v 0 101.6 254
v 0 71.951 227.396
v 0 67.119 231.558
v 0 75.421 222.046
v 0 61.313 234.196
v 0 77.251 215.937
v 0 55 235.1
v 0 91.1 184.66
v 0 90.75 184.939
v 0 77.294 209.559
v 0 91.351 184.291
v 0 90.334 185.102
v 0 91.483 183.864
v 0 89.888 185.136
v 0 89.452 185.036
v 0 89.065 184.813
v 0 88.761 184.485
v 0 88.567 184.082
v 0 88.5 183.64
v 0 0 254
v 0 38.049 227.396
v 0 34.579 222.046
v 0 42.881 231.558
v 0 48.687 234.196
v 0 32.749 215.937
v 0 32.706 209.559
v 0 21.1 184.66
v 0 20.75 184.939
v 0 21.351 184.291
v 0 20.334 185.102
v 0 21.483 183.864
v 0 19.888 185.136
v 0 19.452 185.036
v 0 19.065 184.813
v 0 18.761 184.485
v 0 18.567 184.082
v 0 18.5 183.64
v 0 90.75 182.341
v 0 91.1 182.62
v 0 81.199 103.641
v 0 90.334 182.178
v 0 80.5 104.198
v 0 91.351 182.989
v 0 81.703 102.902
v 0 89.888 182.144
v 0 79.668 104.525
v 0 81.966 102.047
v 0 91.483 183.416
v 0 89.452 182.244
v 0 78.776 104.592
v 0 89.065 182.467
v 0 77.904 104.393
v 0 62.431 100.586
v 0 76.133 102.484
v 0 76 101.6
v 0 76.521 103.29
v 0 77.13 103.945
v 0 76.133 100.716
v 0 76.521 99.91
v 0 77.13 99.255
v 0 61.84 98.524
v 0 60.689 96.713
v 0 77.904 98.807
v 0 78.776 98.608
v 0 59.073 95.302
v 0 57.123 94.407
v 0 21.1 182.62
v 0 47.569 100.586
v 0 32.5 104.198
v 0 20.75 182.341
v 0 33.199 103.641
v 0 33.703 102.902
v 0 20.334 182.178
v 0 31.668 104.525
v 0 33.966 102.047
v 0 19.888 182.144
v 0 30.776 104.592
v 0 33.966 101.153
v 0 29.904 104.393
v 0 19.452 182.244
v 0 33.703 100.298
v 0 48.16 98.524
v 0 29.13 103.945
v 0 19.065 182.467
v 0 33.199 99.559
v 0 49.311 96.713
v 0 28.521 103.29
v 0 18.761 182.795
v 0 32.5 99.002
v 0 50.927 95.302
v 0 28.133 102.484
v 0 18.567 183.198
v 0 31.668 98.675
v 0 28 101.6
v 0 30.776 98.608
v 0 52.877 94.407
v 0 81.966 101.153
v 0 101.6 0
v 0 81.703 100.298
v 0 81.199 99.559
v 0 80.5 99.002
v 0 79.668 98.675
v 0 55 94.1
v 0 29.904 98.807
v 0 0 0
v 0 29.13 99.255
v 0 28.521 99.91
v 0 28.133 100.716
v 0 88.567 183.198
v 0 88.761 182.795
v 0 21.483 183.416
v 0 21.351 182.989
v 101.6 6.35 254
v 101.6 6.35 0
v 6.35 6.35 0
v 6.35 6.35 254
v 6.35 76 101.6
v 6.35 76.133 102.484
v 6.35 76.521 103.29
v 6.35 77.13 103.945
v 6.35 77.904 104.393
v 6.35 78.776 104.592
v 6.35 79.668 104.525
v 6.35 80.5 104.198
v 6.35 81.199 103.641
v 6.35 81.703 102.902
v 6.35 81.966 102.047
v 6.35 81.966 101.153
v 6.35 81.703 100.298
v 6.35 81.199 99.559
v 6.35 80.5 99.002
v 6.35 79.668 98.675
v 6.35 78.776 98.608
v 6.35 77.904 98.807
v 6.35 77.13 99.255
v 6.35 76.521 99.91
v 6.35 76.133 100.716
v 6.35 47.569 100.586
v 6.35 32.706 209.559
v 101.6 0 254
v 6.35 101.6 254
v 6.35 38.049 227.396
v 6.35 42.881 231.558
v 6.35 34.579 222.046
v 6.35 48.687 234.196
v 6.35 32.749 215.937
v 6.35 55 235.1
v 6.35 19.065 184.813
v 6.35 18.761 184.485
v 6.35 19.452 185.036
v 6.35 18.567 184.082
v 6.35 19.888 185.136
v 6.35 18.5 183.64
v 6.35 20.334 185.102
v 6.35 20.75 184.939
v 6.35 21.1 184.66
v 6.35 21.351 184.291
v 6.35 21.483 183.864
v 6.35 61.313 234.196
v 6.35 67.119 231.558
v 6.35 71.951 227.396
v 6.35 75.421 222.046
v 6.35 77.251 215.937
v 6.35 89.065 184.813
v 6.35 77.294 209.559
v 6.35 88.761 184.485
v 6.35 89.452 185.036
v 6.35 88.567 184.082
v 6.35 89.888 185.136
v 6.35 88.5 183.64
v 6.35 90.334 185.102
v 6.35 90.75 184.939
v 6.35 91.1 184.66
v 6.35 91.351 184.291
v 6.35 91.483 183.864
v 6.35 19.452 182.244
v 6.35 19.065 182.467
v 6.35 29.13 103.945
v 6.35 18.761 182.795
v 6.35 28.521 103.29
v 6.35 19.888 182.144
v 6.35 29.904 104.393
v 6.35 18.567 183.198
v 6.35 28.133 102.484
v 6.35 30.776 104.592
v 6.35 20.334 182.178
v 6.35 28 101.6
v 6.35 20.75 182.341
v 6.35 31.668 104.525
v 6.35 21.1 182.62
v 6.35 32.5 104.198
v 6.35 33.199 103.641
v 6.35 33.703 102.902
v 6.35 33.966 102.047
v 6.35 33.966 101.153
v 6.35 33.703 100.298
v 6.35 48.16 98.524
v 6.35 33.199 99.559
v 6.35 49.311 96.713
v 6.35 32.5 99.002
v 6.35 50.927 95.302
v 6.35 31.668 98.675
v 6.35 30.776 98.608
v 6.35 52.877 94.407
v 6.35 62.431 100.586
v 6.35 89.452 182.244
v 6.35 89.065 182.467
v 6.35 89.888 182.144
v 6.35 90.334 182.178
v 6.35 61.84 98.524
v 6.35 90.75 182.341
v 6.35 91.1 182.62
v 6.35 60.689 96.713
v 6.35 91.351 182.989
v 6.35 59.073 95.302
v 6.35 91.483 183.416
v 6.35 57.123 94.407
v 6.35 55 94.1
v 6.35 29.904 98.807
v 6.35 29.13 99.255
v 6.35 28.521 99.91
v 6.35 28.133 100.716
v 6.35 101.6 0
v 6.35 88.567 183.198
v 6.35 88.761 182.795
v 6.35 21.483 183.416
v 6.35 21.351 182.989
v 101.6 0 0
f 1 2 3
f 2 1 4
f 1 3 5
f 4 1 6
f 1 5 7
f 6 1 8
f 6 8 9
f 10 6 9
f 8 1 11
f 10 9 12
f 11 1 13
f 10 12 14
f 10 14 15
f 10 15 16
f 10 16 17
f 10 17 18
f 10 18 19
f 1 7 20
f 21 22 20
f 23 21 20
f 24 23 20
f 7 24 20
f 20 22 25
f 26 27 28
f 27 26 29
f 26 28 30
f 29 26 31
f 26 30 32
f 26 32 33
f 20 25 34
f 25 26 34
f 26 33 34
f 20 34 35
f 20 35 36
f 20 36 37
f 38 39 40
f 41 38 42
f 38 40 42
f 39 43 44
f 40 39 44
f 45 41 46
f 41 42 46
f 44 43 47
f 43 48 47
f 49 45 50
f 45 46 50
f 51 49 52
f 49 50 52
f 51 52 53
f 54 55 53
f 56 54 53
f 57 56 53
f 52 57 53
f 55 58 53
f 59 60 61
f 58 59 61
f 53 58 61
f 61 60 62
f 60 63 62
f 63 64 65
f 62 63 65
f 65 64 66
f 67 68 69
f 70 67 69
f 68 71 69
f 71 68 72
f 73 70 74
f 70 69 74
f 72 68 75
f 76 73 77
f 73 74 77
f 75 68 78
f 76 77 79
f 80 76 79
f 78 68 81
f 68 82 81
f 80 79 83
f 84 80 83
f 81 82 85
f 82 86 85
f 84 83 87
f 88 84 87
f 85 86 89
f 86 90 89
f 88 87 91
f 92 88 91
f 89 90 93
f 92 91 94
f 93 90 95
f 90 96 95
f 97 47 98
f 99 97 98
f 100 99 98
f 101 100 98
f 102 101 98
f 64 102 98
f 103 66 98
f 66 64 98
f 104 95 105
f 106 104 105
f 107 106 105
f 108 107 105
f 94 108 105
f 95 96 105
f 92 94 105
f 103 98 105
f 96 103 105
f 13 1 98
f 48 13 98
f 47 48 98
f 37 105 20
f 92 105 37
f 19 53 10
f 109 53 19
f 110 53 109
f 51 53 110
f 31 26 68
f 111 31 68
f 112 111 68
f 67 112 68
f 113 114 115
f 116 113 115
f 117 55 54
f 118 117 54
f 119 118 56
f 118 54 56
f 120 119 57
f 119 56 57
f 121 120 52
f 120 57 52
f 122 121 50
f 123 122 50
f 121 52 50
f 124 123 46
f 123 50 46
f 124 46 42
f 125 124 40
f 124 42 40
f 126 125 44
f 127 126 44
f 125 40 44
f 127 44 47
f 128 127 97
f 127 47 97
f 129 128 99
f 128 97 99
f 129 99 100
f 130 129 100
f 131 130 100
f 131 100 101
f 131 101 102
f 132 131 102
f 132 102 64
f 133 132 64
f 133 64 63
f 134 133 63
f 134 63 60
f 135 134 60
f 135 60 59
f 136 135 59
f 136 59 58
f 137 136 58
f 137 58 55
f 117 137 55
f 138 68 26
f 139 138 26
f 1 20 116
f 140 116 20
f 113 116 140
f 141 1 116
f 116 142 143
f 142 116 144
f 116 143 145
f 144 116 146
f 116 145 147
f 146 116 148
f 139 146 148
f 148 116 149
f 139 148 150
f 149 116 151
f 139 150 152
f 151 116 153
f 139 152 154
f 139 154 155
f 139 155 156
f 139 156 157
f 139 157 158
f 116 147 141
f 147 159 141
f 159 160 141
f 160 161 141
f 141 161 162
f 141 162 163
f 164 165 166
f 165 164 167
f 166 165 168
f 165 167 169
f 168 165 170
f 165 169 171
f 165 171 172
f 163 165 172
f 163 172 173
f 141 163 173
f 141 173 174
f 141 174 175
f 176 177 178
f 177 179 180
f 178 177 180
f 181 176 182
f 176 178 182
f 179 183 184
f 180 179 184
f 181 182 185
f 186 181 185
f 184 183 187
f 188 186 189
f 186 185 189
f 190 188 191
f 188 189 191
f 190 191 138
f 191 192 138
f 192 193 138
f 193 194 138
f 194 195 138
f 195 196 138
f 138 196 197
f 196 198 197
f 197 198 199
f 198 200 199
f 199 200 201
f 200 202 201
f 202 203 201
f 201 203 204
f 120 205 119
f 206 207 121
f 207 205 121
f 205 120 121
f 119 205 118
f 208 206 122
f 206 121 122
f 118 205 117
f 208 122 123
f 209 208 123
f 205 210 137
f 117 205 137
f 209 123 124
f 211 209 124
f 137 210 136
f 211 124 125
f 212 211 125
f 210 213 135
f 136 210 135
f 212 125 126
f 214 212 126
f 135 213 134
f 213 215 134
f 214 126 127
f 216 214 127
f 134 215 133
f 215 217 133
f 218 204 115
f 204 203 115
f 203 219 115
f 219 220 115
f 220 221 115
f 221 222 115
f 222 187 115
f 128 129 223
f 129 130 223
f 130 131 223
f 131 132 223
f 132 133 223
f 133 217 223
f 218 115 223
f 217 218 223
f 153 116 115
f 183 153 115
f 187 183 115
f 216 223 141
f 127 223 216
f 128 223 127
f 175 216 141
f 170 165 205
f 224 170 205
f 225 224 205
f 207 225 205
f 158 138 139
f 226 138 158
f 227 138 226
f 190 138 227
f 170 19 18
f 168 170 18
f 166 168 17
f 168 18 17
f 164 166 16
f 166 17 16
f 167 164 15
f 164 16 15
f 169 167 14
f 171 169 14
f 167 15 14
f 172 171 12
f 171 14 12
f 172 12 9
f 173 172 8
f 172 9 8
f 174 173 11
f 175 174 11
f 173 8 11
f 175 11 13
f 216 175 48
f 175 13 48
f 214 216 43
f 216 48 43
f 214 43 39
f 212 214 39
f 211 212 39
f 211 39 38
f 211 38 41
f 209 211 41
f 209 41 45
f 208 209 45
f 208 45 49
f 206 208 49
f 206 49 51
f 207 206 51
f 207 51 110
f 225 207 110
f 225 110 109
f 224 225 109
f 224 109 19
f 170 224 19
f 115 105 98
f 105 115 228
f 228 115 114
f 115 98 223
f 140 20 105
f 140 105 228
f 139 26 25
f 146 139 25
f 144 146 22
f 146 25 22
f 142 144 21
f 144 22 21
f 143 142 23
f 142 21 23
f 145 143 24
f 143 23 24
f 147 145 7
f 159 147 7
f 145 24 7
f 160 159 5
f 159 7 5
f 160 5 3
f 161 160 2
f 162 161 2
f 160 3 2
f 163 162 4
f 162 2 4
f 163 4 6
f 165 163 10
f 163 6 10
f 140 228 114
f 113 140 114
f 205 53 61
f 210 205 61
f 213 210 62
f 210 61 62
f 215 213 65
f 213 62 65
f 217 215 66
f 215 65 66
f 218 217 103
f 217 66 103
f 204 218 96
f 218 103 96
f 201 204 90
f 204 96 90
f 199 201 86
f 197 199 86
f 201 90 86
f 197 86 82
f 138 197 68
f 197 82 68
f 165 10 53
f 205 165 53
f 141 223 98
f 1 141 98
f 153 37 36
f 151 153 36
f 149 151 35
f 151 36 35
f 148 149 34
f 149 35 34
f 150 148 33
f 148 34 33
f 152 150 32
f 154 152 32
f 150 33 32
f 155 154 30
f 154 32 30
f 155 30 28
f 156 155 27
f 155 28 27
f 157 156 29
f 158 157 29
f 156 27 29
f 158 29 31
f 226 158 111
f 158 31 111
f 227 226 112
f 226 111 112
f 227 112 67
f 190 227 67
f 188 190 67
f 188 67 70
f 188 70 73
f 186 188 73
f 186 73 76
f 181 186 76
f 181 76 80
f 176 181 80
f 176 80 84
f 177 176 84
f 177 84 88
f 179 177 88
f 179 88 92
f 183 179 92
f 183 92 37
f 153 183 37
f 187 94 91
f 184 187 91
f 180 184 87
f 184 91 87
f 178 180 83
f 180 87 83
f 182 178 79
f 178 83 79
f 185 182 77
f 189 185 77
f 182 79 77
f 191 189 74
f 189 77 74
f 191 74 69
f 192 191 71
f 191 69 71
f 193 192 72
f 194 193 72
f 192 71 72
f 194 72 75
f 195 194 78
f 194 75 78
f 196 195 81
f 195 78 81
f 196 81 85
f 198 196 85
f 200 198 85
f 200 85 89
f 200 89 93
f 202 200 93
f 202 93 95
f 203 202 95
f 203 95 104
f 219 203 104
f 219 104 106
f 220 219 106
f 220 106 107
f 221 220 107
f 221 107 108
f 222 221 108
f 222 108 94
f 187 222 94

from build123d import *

# Parameters (mm, degrees)
SALIENTE_EXTRUIR1_DEPTH = 254
CROQUIS2_R              = 7.5
CROQUIS2_R_2            = 22.5
CROQUIS2_R_3            = 1.5
CORTAR_EXTRUIR1_DEPTH   = 254
CROQUIS3_R              = 3
CORTAR_EXTRUIR2_DEPTH   = 292.823782444


with BuildPart() as part:
    # Croquis1 → Saliente-Extruir1 (new body)
    with BuildSketch(Plane.XY):
        Polygon((0, 101.6), (0, 0), (101.6, 0), (101.6, 6.35), (6.35, 6.35), (6.35, 101.6), align=None)
    extrude(amount=SALIENTE_EXTRUIR1_DEPTH)

    # Croquis2 → Cortar-Extruir1 (cut)
    with BuildSketch(Plane.ZY):
        with Locations((101.6, 55)):
            Circle(CROQUIS2_R)
        with BuildLine():
            Line((209.559459459, 77.293611489), (100.586486486, 62.43120383))
            ThreePointArc((100.586486486, 62.43120383), (106.531969619, 60.650281026), (109.1, 55))
            ThreePointArc((109.1, 55), (106.531969619, 49.349718974), (100.586486486, 47.56879617))
            Line((100.586486486, 47.56879617), (209.559459459, 32.706388511))
            ThreePointArc((209.559459459, 32.706388511), (190.1, 55), (209.559459459, 77.293611489))
        make_face()
        with Locations((212.6, 55)):
            Circle(CROQUIS2_R_2)
        with Locations(Location((183.64, 90, 0), (0, 0, 270))):
            Circle(CROQUIS2_R_3)
        with Locations(Location((183.64, 20, 0), (0, 0, 270))):
            Circle(CROQUIS2_R_3)
    extrude(amount=-CORTAR_EXTRUIR1_DEPTH, mode=Mode.SUBTRACT)

    # Croquis3 → Cortar-Extruir2 (cut, through all)
    with BuildSketch(Plane.ZY):
        with Locations(Location((101.6, 79, 0), (0, 0, 270))):
            Circle(CROQUIS3_R)
        with Locations(Location((101.6, 31, 0), (0, 0, 270))):
            Circle(CROQUIS3_R)
    extrude(amount=-CORTAR_EXTRUIR2_DEPTH, mode=Mode.SUBTRACT)


solid = part.part
